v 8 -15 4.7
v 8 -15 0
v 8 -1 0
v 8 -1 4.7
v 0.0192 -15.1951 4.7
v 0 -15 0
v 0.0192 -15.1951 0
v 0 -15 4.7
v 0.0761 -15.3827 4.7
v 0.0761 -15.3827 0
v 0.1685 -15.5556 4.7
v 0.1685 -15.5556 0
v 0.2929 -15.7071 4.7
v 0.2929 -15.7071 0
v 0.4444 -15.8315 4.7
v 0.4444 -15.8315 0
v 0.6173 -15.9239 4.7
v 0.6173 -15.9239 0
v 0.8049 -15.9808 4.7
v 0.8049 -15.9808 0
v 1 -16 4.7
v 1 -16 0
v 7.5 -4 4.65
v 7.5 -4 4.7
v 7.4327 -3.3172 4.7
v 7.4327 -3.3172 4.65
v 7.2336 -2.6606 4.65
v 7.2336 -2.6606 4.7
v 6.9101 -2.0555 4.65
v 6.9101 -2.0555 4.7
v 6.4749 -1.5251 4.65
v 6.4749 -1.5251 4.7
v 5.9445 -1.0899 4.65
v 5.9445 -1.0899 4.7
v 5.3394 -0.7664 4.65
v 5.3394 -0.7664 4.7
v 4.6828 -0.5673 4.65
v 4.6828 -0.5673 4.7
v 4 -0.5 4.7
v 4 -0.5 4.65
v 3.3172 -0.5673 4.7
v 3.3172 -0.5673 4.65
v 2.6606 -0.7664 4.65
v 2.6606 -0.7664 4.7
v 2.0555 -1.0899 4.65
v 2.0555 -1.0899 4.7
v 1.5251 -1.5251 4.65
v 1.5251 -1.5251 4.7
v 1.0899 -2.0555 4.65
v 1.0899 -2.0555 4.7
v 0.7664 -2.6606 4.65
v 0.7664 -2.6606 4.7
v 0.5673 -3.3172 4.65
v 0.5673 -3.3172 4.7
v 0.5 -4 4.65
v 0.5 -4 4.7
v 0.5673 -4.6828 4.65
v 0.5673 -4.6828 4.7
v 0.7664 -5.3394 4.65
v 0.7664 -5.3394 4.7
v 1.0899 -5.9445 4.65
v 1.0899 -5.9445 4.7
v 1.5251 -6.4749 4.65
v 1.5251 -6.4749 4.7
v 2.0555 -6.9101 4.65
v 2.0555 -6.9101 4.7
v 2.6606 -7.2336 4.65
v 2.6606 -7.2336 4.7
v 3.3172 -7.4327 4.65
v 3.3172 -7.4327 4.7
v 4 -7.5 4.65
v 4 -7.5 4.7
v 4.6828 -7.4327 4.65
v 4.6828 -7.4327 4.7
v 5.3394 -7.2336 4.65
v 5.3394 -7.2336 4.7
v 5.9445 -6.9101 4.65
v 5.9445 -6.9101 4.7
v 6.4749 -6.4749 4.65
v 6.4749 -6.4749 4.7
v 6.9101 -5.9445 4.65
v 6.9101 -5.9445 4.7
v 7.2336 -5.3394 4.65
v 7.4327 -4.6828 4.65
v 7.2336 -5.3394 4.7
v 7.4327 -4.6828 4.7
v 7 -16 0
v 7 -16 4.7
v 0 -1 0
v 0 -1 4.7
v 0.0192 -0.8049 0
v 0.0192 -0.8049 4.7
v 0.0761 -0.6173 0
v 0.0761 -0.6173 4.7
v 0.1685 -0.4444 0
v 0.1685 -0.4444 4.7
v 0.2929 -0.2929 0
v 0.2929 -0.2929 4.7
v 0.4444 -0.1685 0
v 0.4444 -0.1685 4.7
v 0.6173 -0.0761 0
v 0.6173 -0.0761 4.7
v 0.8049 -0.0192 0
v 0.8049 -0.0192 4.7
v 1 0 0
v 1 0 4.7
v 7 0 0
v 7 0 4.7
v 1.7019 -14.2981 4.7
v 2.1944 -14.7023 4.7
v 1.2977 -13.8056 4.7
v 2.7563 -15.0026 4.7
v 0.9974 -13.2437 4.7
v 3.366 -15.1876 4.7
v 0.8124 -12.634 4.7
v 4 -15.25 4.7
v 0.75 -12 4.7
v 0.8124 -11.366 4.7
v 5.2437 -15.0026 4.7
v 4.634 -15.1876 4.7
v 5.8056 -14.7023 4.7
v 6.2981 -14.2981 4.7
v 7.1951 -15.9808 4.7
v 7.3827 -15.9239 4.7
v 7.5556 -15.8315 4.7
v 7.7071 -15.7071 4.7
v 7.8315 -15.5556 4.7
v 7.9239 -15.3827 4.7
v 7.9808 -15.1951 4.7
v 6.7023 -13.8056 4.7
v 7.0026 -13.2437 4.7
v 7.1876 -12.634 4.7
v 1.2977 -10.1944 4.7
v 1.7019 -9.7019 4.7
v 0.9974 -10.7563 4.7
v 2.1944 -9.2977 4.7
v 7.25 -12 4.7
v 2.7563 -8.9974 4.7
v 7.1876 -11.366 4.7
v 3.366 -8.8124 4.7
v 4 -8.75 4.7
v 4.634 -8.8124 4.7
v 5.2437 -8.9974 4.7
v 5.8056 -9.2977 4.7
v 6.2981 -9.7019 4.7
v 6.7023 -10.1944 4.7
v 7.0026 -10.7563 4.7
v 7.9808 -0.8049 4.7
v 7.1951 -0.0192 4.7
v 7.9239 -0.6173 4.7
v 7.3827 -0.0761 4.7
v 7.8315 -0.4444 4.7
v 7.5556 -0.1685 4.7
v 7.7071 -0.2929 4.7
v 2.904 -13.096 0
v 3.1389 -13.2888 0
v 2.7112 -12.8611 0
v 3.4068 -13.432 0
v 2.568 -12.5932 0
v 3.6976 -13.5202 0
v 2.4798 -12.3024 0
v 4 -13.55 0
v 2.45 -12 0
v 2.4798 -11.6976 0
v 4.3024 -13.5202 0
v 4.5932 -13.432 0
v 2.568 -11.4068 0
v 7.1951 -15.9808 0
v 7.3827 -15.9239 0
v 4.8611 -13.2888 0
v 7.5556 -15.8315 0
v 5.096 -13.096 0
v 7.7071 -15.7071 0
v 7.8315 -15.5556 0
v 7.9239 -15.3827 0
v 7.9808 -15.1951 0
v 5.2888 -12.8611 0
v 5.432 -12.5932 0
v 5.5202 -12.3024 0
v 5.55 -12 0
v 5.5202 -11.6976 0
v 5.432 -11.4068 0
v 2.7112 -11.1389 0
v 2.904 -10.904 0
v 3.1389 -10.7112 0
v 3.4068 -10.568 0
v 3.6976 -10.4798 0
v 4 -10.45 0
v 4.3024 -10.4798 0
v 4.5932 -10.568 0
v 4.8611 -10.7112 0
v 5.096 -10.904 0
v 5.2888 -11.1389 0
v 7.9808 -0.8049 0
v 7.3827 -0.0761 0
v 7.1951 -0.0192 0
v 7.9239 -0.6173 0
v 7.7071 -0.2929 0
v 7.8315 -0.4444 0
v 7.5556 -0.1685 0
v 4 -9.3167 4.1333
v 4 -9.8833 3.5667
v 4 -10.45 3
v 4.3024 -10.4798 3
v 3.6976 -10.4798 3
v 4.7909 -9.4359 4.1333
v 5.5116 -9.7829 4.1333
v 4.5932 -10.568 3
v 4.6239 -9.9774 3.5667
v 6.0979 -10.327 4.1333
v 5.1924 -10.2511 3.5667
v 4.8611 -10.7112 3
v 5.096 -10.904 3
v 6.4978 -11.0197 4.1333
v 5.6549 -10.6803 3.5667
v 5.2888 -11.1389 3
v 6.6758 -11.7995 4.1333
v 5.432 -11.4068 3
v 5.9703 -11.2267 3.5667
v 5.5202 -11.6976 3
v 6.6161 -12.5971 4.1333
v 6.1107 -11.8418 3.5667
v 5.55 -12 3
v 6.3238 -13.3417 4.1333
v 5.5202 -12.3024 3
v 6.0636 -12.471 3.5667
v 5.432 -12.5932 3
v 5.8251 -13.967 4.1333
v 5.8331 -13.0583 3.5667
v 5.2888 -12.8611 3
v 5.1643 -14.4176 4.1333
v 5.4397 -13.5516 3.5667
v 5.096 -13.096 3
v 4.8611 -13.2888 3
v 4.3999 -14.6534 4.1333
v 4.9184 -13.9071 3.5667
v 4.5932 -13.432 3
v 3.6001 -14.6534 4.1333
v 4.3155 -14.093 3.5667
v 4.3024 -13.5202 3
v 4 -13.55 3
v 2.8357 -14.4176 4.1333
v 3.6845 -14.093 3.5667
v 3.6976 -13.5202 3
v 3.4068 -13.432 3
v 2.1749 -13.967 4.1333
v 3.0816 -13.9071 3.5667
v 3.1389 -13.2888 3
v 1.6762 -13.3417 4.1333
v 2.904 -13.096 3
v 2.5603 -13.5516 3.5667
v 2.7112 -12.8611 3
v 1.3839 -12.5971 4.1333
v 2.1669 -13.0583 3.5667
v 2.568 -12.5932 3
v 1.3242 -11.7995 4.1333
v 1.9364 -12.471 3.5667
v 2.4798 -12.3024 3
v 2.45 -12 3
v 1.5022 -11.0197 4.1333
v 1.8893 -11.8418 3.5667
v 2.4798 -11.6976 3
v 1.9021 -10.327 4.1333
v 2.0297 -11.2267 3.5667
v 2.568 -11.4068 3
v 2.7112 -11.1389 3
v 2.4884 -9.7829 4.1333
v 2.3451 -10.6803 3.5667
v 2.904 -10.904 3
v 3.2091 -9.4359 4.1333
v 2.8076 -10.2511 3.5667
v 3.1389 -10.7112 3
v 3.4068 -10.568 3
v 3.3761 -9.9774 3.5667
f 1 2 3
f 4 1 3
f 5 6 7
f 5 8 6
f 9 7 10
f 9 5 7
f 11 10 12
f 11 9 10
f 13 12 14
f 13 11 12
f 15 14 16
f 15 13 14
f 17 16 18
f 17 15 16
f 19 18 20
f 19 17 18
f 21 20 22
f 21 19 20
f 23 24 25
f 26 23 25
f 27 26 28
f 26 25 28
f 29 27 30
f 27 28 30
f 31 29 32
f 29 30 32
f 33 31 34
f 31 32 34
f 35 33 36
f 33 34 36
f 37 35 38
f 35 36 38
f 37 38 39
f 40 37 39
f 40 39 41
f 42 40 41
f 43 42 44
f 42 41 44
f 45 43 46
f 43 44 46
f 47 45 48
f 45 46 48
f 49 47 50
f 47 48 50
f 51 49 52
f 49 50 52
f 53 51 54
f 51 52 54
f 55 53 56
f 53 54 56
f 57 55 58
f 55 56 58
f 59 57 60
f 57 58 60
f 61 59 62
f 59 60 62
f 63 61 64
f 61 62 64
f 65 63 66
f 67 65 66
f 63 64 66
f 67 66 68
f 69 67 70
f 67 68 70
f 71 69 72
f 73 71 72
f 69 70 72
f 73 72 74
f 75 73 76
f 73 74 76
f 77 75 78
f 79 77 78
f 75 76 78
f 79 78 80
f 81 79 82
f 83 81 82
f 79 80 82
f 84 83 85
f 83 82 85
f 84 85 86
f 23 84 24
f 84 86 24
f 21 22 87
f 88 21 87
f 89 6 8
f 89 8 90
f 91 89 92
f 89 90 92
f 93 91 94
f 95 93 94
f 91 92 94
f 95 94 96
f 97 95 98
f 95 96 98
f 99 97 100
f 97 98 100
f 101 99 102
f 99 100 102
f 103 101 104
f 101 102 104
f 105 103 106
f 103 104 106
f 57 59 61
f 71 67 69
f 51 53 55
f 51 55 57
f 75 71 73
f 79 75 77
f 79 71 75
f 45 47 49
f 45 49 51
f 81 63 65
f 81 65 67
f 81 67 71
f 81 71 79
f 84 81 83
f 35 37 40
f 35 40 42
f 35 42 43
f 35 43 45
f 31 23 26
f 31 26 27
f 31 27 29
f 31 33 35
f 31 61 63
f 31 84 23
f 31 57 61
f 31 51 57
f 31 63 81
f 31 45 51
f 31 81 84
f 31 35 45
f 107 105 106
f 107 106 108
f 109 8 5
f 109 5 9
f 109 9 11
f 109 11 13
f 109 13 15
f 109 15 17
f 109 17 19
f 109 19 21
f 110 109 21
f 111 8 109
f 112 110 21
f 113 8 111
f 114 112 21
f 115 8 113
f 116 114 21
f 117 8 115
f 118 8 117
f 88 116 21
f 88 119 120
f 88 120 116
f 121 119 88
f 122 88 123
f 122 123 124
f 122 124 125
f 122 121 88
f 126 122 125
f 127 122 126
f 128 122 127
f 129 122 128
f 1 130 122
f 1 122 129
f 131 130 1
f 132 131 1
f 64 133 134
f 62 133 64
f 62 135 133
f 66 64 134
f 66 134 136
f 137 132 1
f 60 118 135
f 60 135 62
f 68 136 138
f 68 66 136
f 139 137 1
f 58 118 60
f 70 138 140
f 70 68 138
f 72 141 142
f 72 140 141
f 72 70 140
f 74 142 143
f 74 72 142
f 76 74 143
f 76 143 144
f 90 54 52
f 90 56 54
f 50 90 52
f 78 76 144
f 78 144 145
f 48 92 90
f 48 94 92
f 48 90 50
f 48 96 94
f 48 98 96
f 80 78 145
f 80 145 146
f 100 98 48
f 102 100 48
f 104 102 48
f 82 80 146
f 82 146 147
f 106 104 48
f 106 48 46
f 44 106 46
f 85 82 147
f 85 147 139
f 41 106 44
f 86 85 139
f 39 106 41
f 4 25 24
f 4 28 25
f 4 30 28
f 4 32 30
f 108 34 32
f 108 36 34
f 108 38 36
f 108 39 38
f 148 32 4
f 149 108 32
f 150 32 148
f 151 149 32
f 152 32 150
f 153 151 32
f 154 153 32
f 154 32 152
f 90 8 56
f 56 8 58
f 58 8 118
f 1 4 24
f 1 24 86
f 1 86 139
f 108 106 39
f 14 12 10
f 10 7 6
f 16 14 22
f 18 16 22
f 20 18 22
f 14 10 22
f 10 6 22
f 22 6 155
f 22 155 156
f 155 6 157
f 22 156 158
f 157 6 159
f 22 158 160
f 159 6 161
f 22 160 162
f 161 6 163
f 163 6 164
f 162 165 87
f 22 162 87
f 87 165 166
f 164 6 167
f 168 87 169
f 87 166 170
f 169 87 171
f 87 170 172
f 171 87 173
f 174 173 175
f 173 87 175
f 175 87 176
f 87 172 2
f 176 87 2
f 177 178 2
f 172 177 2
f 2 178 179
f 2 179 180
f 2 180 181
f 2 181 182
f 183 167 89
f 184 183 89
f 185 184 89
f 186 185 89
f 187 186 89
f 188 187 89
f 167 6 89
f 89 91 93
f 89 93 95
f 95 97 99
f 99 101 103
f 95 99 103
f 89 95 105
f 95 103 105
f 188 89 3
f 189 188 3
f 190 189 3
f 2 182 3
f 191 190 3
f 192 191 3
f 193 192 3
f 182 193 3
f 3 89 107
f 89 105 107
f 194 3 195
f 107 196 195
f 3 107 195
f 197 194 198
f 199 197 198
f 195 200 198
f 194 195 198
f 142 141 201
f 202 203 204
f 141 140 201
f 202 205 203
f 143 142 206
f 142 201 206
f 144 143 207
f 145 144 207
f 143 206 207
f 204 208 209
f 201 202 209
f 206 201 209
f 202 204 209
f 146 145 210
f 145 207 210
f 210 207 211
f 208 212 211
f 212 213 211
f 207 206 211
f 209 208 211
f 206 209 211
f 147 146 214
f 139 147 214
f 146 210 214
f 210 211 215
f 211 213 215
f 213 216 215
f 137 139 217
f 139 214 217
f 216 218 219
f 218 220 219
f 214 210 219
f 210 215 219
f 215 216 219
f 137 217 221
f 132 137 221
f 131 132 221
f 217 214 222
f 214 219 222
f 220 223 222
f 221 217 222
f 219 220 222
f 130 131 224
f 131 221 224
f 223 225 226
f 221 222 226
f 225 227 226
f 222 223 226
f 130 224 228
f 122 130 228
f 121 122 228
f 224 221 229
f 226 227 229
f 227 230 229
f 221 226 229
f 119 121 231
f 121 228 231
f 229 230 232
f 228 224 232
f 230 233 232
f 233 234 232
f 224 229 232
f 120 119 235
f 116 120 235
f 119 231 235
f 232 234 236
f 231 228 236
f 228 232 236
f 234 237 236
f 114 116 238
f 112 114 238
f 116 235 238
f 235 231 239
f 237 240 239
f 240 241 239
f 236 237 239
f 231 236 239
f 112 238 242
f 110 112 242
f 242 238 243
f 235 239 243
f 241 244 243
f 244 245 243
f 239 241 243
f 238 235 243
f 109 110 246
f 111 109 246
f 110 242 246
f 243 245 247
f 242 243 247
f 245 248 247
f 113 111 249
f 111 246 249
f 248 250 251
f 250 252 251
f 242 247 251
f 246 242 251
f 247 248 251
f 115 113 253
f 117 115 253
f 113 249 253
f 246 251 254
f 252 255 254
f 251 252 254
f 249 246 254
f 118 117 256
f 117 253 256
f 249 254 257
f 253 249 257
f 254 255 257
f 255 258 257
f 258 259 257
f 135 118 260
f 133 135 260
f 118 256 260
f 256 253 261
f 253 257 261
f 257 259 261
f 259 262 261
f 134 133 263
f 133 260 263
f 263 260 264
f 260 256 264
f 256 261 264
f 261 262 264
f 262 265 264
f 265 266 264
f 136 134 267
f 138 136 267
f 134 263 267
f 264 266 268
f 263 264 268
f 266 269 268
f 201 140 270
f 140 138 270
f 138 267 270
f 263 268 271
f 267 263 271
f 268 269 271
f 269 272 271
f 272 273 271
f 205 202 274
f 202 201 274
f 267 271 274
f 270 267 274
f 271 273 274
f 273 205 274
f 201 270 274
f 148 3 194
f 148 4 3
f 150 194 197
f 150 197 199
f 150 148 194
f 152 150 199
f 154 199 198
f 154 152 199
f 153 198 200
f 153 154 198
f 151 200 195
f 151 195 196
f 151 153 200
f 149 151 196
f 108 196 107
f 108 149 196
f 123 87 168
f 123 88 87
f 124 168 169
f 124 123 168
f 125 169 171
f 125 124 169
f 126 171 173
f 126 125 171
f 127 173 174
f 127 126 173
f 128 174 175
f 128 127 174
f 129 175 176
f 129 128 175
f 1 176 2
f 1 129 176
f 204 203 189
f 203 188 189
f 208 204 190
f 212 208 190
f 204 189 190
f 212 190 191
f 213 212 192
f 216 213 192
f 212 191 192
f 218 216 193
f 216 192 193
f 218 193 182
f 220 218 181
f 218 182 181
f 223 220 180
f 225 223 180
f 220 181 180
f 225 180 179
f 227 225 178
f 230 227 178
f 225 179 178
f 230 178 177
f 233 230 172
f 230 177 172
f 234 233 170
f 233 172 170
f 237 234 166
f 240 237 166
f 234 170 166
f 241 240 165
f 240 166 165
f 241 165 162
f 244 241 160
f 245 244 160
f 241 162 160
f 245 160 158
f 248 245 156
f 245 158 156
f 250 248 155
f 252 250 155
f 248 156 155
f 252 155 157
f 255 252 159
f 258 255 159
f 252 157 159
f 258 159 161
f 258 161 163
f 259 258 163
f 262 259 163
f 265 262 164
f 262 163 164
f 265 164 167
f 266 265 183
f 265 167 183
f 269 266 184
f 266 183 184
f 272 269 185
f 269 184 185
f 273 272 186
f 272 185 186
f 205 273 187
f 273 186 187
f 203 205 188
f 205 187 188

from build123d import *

# Parameters (mm, degrees)
SKIZZE1_W                       = 8
SKIZZE1_H                       = 16
AUFSATZ_LINEAR_AUSTRAGEN1_DEPTH = 4.7
VERRUNDUNG1_R                   = 1
SKIZZE2_R                       = 3.5
SCHNITT_LINEAR_AUSTRAGEN1_DEPTH = 0.05


with BuildPart() as part:
    # Skizze1 → Aufsatz-Linear austragen1 (new body)
    with BuildSketch(Plane.XY):
        with Locations((4, -8)):
            Rectangle(SKIZZE1_W, SKIZZE1_H)
    extrude(amount=AUFSATZ_LINEAR_AUSTRAGEN1_DEPTH)

    # Verrundung1
    verrundung1_edges = [part.edges().sort_by_distance(p)[0] for p in [
        (0, 0, 2.35),
        (8, 0, 2.35),
        (8, -16, 2.35),
        (0, -16, 2.35),
    ]]
    fillet(verrundung1_edges, radius=VERRUNDUNG1_R)

    # Skizze2 → Schnitt-Linear austragen1 (cut)
    with BuildSketch(Plane.XY.offset(4.7)):
        with Locations((4, -4)):
            Circle(SKIZZE2_R)
    extrude(amount=-SCHNITT_LINEAR_AUSTRAGEN1_DEPTH, mode=Mode.SUBTRACT)

    # Skizze3 → Schnitt-Rotation1 (revolve, cut)
    with BuildSketch(Plane(origin=(4, 0, 0), x_dir=(0, 0, -1), z_dir=(1, 0, 0))):
        Polygon((-4.7, -8.75), (-3, -10.45), (0, -10.45), (0, -12), (-4.7, -12), align=None)
    revolve(axis=Axis((4, -12, 4.7), (0, 0, -1)), mode=Mode.SUBTRACT)


solid = part.part
